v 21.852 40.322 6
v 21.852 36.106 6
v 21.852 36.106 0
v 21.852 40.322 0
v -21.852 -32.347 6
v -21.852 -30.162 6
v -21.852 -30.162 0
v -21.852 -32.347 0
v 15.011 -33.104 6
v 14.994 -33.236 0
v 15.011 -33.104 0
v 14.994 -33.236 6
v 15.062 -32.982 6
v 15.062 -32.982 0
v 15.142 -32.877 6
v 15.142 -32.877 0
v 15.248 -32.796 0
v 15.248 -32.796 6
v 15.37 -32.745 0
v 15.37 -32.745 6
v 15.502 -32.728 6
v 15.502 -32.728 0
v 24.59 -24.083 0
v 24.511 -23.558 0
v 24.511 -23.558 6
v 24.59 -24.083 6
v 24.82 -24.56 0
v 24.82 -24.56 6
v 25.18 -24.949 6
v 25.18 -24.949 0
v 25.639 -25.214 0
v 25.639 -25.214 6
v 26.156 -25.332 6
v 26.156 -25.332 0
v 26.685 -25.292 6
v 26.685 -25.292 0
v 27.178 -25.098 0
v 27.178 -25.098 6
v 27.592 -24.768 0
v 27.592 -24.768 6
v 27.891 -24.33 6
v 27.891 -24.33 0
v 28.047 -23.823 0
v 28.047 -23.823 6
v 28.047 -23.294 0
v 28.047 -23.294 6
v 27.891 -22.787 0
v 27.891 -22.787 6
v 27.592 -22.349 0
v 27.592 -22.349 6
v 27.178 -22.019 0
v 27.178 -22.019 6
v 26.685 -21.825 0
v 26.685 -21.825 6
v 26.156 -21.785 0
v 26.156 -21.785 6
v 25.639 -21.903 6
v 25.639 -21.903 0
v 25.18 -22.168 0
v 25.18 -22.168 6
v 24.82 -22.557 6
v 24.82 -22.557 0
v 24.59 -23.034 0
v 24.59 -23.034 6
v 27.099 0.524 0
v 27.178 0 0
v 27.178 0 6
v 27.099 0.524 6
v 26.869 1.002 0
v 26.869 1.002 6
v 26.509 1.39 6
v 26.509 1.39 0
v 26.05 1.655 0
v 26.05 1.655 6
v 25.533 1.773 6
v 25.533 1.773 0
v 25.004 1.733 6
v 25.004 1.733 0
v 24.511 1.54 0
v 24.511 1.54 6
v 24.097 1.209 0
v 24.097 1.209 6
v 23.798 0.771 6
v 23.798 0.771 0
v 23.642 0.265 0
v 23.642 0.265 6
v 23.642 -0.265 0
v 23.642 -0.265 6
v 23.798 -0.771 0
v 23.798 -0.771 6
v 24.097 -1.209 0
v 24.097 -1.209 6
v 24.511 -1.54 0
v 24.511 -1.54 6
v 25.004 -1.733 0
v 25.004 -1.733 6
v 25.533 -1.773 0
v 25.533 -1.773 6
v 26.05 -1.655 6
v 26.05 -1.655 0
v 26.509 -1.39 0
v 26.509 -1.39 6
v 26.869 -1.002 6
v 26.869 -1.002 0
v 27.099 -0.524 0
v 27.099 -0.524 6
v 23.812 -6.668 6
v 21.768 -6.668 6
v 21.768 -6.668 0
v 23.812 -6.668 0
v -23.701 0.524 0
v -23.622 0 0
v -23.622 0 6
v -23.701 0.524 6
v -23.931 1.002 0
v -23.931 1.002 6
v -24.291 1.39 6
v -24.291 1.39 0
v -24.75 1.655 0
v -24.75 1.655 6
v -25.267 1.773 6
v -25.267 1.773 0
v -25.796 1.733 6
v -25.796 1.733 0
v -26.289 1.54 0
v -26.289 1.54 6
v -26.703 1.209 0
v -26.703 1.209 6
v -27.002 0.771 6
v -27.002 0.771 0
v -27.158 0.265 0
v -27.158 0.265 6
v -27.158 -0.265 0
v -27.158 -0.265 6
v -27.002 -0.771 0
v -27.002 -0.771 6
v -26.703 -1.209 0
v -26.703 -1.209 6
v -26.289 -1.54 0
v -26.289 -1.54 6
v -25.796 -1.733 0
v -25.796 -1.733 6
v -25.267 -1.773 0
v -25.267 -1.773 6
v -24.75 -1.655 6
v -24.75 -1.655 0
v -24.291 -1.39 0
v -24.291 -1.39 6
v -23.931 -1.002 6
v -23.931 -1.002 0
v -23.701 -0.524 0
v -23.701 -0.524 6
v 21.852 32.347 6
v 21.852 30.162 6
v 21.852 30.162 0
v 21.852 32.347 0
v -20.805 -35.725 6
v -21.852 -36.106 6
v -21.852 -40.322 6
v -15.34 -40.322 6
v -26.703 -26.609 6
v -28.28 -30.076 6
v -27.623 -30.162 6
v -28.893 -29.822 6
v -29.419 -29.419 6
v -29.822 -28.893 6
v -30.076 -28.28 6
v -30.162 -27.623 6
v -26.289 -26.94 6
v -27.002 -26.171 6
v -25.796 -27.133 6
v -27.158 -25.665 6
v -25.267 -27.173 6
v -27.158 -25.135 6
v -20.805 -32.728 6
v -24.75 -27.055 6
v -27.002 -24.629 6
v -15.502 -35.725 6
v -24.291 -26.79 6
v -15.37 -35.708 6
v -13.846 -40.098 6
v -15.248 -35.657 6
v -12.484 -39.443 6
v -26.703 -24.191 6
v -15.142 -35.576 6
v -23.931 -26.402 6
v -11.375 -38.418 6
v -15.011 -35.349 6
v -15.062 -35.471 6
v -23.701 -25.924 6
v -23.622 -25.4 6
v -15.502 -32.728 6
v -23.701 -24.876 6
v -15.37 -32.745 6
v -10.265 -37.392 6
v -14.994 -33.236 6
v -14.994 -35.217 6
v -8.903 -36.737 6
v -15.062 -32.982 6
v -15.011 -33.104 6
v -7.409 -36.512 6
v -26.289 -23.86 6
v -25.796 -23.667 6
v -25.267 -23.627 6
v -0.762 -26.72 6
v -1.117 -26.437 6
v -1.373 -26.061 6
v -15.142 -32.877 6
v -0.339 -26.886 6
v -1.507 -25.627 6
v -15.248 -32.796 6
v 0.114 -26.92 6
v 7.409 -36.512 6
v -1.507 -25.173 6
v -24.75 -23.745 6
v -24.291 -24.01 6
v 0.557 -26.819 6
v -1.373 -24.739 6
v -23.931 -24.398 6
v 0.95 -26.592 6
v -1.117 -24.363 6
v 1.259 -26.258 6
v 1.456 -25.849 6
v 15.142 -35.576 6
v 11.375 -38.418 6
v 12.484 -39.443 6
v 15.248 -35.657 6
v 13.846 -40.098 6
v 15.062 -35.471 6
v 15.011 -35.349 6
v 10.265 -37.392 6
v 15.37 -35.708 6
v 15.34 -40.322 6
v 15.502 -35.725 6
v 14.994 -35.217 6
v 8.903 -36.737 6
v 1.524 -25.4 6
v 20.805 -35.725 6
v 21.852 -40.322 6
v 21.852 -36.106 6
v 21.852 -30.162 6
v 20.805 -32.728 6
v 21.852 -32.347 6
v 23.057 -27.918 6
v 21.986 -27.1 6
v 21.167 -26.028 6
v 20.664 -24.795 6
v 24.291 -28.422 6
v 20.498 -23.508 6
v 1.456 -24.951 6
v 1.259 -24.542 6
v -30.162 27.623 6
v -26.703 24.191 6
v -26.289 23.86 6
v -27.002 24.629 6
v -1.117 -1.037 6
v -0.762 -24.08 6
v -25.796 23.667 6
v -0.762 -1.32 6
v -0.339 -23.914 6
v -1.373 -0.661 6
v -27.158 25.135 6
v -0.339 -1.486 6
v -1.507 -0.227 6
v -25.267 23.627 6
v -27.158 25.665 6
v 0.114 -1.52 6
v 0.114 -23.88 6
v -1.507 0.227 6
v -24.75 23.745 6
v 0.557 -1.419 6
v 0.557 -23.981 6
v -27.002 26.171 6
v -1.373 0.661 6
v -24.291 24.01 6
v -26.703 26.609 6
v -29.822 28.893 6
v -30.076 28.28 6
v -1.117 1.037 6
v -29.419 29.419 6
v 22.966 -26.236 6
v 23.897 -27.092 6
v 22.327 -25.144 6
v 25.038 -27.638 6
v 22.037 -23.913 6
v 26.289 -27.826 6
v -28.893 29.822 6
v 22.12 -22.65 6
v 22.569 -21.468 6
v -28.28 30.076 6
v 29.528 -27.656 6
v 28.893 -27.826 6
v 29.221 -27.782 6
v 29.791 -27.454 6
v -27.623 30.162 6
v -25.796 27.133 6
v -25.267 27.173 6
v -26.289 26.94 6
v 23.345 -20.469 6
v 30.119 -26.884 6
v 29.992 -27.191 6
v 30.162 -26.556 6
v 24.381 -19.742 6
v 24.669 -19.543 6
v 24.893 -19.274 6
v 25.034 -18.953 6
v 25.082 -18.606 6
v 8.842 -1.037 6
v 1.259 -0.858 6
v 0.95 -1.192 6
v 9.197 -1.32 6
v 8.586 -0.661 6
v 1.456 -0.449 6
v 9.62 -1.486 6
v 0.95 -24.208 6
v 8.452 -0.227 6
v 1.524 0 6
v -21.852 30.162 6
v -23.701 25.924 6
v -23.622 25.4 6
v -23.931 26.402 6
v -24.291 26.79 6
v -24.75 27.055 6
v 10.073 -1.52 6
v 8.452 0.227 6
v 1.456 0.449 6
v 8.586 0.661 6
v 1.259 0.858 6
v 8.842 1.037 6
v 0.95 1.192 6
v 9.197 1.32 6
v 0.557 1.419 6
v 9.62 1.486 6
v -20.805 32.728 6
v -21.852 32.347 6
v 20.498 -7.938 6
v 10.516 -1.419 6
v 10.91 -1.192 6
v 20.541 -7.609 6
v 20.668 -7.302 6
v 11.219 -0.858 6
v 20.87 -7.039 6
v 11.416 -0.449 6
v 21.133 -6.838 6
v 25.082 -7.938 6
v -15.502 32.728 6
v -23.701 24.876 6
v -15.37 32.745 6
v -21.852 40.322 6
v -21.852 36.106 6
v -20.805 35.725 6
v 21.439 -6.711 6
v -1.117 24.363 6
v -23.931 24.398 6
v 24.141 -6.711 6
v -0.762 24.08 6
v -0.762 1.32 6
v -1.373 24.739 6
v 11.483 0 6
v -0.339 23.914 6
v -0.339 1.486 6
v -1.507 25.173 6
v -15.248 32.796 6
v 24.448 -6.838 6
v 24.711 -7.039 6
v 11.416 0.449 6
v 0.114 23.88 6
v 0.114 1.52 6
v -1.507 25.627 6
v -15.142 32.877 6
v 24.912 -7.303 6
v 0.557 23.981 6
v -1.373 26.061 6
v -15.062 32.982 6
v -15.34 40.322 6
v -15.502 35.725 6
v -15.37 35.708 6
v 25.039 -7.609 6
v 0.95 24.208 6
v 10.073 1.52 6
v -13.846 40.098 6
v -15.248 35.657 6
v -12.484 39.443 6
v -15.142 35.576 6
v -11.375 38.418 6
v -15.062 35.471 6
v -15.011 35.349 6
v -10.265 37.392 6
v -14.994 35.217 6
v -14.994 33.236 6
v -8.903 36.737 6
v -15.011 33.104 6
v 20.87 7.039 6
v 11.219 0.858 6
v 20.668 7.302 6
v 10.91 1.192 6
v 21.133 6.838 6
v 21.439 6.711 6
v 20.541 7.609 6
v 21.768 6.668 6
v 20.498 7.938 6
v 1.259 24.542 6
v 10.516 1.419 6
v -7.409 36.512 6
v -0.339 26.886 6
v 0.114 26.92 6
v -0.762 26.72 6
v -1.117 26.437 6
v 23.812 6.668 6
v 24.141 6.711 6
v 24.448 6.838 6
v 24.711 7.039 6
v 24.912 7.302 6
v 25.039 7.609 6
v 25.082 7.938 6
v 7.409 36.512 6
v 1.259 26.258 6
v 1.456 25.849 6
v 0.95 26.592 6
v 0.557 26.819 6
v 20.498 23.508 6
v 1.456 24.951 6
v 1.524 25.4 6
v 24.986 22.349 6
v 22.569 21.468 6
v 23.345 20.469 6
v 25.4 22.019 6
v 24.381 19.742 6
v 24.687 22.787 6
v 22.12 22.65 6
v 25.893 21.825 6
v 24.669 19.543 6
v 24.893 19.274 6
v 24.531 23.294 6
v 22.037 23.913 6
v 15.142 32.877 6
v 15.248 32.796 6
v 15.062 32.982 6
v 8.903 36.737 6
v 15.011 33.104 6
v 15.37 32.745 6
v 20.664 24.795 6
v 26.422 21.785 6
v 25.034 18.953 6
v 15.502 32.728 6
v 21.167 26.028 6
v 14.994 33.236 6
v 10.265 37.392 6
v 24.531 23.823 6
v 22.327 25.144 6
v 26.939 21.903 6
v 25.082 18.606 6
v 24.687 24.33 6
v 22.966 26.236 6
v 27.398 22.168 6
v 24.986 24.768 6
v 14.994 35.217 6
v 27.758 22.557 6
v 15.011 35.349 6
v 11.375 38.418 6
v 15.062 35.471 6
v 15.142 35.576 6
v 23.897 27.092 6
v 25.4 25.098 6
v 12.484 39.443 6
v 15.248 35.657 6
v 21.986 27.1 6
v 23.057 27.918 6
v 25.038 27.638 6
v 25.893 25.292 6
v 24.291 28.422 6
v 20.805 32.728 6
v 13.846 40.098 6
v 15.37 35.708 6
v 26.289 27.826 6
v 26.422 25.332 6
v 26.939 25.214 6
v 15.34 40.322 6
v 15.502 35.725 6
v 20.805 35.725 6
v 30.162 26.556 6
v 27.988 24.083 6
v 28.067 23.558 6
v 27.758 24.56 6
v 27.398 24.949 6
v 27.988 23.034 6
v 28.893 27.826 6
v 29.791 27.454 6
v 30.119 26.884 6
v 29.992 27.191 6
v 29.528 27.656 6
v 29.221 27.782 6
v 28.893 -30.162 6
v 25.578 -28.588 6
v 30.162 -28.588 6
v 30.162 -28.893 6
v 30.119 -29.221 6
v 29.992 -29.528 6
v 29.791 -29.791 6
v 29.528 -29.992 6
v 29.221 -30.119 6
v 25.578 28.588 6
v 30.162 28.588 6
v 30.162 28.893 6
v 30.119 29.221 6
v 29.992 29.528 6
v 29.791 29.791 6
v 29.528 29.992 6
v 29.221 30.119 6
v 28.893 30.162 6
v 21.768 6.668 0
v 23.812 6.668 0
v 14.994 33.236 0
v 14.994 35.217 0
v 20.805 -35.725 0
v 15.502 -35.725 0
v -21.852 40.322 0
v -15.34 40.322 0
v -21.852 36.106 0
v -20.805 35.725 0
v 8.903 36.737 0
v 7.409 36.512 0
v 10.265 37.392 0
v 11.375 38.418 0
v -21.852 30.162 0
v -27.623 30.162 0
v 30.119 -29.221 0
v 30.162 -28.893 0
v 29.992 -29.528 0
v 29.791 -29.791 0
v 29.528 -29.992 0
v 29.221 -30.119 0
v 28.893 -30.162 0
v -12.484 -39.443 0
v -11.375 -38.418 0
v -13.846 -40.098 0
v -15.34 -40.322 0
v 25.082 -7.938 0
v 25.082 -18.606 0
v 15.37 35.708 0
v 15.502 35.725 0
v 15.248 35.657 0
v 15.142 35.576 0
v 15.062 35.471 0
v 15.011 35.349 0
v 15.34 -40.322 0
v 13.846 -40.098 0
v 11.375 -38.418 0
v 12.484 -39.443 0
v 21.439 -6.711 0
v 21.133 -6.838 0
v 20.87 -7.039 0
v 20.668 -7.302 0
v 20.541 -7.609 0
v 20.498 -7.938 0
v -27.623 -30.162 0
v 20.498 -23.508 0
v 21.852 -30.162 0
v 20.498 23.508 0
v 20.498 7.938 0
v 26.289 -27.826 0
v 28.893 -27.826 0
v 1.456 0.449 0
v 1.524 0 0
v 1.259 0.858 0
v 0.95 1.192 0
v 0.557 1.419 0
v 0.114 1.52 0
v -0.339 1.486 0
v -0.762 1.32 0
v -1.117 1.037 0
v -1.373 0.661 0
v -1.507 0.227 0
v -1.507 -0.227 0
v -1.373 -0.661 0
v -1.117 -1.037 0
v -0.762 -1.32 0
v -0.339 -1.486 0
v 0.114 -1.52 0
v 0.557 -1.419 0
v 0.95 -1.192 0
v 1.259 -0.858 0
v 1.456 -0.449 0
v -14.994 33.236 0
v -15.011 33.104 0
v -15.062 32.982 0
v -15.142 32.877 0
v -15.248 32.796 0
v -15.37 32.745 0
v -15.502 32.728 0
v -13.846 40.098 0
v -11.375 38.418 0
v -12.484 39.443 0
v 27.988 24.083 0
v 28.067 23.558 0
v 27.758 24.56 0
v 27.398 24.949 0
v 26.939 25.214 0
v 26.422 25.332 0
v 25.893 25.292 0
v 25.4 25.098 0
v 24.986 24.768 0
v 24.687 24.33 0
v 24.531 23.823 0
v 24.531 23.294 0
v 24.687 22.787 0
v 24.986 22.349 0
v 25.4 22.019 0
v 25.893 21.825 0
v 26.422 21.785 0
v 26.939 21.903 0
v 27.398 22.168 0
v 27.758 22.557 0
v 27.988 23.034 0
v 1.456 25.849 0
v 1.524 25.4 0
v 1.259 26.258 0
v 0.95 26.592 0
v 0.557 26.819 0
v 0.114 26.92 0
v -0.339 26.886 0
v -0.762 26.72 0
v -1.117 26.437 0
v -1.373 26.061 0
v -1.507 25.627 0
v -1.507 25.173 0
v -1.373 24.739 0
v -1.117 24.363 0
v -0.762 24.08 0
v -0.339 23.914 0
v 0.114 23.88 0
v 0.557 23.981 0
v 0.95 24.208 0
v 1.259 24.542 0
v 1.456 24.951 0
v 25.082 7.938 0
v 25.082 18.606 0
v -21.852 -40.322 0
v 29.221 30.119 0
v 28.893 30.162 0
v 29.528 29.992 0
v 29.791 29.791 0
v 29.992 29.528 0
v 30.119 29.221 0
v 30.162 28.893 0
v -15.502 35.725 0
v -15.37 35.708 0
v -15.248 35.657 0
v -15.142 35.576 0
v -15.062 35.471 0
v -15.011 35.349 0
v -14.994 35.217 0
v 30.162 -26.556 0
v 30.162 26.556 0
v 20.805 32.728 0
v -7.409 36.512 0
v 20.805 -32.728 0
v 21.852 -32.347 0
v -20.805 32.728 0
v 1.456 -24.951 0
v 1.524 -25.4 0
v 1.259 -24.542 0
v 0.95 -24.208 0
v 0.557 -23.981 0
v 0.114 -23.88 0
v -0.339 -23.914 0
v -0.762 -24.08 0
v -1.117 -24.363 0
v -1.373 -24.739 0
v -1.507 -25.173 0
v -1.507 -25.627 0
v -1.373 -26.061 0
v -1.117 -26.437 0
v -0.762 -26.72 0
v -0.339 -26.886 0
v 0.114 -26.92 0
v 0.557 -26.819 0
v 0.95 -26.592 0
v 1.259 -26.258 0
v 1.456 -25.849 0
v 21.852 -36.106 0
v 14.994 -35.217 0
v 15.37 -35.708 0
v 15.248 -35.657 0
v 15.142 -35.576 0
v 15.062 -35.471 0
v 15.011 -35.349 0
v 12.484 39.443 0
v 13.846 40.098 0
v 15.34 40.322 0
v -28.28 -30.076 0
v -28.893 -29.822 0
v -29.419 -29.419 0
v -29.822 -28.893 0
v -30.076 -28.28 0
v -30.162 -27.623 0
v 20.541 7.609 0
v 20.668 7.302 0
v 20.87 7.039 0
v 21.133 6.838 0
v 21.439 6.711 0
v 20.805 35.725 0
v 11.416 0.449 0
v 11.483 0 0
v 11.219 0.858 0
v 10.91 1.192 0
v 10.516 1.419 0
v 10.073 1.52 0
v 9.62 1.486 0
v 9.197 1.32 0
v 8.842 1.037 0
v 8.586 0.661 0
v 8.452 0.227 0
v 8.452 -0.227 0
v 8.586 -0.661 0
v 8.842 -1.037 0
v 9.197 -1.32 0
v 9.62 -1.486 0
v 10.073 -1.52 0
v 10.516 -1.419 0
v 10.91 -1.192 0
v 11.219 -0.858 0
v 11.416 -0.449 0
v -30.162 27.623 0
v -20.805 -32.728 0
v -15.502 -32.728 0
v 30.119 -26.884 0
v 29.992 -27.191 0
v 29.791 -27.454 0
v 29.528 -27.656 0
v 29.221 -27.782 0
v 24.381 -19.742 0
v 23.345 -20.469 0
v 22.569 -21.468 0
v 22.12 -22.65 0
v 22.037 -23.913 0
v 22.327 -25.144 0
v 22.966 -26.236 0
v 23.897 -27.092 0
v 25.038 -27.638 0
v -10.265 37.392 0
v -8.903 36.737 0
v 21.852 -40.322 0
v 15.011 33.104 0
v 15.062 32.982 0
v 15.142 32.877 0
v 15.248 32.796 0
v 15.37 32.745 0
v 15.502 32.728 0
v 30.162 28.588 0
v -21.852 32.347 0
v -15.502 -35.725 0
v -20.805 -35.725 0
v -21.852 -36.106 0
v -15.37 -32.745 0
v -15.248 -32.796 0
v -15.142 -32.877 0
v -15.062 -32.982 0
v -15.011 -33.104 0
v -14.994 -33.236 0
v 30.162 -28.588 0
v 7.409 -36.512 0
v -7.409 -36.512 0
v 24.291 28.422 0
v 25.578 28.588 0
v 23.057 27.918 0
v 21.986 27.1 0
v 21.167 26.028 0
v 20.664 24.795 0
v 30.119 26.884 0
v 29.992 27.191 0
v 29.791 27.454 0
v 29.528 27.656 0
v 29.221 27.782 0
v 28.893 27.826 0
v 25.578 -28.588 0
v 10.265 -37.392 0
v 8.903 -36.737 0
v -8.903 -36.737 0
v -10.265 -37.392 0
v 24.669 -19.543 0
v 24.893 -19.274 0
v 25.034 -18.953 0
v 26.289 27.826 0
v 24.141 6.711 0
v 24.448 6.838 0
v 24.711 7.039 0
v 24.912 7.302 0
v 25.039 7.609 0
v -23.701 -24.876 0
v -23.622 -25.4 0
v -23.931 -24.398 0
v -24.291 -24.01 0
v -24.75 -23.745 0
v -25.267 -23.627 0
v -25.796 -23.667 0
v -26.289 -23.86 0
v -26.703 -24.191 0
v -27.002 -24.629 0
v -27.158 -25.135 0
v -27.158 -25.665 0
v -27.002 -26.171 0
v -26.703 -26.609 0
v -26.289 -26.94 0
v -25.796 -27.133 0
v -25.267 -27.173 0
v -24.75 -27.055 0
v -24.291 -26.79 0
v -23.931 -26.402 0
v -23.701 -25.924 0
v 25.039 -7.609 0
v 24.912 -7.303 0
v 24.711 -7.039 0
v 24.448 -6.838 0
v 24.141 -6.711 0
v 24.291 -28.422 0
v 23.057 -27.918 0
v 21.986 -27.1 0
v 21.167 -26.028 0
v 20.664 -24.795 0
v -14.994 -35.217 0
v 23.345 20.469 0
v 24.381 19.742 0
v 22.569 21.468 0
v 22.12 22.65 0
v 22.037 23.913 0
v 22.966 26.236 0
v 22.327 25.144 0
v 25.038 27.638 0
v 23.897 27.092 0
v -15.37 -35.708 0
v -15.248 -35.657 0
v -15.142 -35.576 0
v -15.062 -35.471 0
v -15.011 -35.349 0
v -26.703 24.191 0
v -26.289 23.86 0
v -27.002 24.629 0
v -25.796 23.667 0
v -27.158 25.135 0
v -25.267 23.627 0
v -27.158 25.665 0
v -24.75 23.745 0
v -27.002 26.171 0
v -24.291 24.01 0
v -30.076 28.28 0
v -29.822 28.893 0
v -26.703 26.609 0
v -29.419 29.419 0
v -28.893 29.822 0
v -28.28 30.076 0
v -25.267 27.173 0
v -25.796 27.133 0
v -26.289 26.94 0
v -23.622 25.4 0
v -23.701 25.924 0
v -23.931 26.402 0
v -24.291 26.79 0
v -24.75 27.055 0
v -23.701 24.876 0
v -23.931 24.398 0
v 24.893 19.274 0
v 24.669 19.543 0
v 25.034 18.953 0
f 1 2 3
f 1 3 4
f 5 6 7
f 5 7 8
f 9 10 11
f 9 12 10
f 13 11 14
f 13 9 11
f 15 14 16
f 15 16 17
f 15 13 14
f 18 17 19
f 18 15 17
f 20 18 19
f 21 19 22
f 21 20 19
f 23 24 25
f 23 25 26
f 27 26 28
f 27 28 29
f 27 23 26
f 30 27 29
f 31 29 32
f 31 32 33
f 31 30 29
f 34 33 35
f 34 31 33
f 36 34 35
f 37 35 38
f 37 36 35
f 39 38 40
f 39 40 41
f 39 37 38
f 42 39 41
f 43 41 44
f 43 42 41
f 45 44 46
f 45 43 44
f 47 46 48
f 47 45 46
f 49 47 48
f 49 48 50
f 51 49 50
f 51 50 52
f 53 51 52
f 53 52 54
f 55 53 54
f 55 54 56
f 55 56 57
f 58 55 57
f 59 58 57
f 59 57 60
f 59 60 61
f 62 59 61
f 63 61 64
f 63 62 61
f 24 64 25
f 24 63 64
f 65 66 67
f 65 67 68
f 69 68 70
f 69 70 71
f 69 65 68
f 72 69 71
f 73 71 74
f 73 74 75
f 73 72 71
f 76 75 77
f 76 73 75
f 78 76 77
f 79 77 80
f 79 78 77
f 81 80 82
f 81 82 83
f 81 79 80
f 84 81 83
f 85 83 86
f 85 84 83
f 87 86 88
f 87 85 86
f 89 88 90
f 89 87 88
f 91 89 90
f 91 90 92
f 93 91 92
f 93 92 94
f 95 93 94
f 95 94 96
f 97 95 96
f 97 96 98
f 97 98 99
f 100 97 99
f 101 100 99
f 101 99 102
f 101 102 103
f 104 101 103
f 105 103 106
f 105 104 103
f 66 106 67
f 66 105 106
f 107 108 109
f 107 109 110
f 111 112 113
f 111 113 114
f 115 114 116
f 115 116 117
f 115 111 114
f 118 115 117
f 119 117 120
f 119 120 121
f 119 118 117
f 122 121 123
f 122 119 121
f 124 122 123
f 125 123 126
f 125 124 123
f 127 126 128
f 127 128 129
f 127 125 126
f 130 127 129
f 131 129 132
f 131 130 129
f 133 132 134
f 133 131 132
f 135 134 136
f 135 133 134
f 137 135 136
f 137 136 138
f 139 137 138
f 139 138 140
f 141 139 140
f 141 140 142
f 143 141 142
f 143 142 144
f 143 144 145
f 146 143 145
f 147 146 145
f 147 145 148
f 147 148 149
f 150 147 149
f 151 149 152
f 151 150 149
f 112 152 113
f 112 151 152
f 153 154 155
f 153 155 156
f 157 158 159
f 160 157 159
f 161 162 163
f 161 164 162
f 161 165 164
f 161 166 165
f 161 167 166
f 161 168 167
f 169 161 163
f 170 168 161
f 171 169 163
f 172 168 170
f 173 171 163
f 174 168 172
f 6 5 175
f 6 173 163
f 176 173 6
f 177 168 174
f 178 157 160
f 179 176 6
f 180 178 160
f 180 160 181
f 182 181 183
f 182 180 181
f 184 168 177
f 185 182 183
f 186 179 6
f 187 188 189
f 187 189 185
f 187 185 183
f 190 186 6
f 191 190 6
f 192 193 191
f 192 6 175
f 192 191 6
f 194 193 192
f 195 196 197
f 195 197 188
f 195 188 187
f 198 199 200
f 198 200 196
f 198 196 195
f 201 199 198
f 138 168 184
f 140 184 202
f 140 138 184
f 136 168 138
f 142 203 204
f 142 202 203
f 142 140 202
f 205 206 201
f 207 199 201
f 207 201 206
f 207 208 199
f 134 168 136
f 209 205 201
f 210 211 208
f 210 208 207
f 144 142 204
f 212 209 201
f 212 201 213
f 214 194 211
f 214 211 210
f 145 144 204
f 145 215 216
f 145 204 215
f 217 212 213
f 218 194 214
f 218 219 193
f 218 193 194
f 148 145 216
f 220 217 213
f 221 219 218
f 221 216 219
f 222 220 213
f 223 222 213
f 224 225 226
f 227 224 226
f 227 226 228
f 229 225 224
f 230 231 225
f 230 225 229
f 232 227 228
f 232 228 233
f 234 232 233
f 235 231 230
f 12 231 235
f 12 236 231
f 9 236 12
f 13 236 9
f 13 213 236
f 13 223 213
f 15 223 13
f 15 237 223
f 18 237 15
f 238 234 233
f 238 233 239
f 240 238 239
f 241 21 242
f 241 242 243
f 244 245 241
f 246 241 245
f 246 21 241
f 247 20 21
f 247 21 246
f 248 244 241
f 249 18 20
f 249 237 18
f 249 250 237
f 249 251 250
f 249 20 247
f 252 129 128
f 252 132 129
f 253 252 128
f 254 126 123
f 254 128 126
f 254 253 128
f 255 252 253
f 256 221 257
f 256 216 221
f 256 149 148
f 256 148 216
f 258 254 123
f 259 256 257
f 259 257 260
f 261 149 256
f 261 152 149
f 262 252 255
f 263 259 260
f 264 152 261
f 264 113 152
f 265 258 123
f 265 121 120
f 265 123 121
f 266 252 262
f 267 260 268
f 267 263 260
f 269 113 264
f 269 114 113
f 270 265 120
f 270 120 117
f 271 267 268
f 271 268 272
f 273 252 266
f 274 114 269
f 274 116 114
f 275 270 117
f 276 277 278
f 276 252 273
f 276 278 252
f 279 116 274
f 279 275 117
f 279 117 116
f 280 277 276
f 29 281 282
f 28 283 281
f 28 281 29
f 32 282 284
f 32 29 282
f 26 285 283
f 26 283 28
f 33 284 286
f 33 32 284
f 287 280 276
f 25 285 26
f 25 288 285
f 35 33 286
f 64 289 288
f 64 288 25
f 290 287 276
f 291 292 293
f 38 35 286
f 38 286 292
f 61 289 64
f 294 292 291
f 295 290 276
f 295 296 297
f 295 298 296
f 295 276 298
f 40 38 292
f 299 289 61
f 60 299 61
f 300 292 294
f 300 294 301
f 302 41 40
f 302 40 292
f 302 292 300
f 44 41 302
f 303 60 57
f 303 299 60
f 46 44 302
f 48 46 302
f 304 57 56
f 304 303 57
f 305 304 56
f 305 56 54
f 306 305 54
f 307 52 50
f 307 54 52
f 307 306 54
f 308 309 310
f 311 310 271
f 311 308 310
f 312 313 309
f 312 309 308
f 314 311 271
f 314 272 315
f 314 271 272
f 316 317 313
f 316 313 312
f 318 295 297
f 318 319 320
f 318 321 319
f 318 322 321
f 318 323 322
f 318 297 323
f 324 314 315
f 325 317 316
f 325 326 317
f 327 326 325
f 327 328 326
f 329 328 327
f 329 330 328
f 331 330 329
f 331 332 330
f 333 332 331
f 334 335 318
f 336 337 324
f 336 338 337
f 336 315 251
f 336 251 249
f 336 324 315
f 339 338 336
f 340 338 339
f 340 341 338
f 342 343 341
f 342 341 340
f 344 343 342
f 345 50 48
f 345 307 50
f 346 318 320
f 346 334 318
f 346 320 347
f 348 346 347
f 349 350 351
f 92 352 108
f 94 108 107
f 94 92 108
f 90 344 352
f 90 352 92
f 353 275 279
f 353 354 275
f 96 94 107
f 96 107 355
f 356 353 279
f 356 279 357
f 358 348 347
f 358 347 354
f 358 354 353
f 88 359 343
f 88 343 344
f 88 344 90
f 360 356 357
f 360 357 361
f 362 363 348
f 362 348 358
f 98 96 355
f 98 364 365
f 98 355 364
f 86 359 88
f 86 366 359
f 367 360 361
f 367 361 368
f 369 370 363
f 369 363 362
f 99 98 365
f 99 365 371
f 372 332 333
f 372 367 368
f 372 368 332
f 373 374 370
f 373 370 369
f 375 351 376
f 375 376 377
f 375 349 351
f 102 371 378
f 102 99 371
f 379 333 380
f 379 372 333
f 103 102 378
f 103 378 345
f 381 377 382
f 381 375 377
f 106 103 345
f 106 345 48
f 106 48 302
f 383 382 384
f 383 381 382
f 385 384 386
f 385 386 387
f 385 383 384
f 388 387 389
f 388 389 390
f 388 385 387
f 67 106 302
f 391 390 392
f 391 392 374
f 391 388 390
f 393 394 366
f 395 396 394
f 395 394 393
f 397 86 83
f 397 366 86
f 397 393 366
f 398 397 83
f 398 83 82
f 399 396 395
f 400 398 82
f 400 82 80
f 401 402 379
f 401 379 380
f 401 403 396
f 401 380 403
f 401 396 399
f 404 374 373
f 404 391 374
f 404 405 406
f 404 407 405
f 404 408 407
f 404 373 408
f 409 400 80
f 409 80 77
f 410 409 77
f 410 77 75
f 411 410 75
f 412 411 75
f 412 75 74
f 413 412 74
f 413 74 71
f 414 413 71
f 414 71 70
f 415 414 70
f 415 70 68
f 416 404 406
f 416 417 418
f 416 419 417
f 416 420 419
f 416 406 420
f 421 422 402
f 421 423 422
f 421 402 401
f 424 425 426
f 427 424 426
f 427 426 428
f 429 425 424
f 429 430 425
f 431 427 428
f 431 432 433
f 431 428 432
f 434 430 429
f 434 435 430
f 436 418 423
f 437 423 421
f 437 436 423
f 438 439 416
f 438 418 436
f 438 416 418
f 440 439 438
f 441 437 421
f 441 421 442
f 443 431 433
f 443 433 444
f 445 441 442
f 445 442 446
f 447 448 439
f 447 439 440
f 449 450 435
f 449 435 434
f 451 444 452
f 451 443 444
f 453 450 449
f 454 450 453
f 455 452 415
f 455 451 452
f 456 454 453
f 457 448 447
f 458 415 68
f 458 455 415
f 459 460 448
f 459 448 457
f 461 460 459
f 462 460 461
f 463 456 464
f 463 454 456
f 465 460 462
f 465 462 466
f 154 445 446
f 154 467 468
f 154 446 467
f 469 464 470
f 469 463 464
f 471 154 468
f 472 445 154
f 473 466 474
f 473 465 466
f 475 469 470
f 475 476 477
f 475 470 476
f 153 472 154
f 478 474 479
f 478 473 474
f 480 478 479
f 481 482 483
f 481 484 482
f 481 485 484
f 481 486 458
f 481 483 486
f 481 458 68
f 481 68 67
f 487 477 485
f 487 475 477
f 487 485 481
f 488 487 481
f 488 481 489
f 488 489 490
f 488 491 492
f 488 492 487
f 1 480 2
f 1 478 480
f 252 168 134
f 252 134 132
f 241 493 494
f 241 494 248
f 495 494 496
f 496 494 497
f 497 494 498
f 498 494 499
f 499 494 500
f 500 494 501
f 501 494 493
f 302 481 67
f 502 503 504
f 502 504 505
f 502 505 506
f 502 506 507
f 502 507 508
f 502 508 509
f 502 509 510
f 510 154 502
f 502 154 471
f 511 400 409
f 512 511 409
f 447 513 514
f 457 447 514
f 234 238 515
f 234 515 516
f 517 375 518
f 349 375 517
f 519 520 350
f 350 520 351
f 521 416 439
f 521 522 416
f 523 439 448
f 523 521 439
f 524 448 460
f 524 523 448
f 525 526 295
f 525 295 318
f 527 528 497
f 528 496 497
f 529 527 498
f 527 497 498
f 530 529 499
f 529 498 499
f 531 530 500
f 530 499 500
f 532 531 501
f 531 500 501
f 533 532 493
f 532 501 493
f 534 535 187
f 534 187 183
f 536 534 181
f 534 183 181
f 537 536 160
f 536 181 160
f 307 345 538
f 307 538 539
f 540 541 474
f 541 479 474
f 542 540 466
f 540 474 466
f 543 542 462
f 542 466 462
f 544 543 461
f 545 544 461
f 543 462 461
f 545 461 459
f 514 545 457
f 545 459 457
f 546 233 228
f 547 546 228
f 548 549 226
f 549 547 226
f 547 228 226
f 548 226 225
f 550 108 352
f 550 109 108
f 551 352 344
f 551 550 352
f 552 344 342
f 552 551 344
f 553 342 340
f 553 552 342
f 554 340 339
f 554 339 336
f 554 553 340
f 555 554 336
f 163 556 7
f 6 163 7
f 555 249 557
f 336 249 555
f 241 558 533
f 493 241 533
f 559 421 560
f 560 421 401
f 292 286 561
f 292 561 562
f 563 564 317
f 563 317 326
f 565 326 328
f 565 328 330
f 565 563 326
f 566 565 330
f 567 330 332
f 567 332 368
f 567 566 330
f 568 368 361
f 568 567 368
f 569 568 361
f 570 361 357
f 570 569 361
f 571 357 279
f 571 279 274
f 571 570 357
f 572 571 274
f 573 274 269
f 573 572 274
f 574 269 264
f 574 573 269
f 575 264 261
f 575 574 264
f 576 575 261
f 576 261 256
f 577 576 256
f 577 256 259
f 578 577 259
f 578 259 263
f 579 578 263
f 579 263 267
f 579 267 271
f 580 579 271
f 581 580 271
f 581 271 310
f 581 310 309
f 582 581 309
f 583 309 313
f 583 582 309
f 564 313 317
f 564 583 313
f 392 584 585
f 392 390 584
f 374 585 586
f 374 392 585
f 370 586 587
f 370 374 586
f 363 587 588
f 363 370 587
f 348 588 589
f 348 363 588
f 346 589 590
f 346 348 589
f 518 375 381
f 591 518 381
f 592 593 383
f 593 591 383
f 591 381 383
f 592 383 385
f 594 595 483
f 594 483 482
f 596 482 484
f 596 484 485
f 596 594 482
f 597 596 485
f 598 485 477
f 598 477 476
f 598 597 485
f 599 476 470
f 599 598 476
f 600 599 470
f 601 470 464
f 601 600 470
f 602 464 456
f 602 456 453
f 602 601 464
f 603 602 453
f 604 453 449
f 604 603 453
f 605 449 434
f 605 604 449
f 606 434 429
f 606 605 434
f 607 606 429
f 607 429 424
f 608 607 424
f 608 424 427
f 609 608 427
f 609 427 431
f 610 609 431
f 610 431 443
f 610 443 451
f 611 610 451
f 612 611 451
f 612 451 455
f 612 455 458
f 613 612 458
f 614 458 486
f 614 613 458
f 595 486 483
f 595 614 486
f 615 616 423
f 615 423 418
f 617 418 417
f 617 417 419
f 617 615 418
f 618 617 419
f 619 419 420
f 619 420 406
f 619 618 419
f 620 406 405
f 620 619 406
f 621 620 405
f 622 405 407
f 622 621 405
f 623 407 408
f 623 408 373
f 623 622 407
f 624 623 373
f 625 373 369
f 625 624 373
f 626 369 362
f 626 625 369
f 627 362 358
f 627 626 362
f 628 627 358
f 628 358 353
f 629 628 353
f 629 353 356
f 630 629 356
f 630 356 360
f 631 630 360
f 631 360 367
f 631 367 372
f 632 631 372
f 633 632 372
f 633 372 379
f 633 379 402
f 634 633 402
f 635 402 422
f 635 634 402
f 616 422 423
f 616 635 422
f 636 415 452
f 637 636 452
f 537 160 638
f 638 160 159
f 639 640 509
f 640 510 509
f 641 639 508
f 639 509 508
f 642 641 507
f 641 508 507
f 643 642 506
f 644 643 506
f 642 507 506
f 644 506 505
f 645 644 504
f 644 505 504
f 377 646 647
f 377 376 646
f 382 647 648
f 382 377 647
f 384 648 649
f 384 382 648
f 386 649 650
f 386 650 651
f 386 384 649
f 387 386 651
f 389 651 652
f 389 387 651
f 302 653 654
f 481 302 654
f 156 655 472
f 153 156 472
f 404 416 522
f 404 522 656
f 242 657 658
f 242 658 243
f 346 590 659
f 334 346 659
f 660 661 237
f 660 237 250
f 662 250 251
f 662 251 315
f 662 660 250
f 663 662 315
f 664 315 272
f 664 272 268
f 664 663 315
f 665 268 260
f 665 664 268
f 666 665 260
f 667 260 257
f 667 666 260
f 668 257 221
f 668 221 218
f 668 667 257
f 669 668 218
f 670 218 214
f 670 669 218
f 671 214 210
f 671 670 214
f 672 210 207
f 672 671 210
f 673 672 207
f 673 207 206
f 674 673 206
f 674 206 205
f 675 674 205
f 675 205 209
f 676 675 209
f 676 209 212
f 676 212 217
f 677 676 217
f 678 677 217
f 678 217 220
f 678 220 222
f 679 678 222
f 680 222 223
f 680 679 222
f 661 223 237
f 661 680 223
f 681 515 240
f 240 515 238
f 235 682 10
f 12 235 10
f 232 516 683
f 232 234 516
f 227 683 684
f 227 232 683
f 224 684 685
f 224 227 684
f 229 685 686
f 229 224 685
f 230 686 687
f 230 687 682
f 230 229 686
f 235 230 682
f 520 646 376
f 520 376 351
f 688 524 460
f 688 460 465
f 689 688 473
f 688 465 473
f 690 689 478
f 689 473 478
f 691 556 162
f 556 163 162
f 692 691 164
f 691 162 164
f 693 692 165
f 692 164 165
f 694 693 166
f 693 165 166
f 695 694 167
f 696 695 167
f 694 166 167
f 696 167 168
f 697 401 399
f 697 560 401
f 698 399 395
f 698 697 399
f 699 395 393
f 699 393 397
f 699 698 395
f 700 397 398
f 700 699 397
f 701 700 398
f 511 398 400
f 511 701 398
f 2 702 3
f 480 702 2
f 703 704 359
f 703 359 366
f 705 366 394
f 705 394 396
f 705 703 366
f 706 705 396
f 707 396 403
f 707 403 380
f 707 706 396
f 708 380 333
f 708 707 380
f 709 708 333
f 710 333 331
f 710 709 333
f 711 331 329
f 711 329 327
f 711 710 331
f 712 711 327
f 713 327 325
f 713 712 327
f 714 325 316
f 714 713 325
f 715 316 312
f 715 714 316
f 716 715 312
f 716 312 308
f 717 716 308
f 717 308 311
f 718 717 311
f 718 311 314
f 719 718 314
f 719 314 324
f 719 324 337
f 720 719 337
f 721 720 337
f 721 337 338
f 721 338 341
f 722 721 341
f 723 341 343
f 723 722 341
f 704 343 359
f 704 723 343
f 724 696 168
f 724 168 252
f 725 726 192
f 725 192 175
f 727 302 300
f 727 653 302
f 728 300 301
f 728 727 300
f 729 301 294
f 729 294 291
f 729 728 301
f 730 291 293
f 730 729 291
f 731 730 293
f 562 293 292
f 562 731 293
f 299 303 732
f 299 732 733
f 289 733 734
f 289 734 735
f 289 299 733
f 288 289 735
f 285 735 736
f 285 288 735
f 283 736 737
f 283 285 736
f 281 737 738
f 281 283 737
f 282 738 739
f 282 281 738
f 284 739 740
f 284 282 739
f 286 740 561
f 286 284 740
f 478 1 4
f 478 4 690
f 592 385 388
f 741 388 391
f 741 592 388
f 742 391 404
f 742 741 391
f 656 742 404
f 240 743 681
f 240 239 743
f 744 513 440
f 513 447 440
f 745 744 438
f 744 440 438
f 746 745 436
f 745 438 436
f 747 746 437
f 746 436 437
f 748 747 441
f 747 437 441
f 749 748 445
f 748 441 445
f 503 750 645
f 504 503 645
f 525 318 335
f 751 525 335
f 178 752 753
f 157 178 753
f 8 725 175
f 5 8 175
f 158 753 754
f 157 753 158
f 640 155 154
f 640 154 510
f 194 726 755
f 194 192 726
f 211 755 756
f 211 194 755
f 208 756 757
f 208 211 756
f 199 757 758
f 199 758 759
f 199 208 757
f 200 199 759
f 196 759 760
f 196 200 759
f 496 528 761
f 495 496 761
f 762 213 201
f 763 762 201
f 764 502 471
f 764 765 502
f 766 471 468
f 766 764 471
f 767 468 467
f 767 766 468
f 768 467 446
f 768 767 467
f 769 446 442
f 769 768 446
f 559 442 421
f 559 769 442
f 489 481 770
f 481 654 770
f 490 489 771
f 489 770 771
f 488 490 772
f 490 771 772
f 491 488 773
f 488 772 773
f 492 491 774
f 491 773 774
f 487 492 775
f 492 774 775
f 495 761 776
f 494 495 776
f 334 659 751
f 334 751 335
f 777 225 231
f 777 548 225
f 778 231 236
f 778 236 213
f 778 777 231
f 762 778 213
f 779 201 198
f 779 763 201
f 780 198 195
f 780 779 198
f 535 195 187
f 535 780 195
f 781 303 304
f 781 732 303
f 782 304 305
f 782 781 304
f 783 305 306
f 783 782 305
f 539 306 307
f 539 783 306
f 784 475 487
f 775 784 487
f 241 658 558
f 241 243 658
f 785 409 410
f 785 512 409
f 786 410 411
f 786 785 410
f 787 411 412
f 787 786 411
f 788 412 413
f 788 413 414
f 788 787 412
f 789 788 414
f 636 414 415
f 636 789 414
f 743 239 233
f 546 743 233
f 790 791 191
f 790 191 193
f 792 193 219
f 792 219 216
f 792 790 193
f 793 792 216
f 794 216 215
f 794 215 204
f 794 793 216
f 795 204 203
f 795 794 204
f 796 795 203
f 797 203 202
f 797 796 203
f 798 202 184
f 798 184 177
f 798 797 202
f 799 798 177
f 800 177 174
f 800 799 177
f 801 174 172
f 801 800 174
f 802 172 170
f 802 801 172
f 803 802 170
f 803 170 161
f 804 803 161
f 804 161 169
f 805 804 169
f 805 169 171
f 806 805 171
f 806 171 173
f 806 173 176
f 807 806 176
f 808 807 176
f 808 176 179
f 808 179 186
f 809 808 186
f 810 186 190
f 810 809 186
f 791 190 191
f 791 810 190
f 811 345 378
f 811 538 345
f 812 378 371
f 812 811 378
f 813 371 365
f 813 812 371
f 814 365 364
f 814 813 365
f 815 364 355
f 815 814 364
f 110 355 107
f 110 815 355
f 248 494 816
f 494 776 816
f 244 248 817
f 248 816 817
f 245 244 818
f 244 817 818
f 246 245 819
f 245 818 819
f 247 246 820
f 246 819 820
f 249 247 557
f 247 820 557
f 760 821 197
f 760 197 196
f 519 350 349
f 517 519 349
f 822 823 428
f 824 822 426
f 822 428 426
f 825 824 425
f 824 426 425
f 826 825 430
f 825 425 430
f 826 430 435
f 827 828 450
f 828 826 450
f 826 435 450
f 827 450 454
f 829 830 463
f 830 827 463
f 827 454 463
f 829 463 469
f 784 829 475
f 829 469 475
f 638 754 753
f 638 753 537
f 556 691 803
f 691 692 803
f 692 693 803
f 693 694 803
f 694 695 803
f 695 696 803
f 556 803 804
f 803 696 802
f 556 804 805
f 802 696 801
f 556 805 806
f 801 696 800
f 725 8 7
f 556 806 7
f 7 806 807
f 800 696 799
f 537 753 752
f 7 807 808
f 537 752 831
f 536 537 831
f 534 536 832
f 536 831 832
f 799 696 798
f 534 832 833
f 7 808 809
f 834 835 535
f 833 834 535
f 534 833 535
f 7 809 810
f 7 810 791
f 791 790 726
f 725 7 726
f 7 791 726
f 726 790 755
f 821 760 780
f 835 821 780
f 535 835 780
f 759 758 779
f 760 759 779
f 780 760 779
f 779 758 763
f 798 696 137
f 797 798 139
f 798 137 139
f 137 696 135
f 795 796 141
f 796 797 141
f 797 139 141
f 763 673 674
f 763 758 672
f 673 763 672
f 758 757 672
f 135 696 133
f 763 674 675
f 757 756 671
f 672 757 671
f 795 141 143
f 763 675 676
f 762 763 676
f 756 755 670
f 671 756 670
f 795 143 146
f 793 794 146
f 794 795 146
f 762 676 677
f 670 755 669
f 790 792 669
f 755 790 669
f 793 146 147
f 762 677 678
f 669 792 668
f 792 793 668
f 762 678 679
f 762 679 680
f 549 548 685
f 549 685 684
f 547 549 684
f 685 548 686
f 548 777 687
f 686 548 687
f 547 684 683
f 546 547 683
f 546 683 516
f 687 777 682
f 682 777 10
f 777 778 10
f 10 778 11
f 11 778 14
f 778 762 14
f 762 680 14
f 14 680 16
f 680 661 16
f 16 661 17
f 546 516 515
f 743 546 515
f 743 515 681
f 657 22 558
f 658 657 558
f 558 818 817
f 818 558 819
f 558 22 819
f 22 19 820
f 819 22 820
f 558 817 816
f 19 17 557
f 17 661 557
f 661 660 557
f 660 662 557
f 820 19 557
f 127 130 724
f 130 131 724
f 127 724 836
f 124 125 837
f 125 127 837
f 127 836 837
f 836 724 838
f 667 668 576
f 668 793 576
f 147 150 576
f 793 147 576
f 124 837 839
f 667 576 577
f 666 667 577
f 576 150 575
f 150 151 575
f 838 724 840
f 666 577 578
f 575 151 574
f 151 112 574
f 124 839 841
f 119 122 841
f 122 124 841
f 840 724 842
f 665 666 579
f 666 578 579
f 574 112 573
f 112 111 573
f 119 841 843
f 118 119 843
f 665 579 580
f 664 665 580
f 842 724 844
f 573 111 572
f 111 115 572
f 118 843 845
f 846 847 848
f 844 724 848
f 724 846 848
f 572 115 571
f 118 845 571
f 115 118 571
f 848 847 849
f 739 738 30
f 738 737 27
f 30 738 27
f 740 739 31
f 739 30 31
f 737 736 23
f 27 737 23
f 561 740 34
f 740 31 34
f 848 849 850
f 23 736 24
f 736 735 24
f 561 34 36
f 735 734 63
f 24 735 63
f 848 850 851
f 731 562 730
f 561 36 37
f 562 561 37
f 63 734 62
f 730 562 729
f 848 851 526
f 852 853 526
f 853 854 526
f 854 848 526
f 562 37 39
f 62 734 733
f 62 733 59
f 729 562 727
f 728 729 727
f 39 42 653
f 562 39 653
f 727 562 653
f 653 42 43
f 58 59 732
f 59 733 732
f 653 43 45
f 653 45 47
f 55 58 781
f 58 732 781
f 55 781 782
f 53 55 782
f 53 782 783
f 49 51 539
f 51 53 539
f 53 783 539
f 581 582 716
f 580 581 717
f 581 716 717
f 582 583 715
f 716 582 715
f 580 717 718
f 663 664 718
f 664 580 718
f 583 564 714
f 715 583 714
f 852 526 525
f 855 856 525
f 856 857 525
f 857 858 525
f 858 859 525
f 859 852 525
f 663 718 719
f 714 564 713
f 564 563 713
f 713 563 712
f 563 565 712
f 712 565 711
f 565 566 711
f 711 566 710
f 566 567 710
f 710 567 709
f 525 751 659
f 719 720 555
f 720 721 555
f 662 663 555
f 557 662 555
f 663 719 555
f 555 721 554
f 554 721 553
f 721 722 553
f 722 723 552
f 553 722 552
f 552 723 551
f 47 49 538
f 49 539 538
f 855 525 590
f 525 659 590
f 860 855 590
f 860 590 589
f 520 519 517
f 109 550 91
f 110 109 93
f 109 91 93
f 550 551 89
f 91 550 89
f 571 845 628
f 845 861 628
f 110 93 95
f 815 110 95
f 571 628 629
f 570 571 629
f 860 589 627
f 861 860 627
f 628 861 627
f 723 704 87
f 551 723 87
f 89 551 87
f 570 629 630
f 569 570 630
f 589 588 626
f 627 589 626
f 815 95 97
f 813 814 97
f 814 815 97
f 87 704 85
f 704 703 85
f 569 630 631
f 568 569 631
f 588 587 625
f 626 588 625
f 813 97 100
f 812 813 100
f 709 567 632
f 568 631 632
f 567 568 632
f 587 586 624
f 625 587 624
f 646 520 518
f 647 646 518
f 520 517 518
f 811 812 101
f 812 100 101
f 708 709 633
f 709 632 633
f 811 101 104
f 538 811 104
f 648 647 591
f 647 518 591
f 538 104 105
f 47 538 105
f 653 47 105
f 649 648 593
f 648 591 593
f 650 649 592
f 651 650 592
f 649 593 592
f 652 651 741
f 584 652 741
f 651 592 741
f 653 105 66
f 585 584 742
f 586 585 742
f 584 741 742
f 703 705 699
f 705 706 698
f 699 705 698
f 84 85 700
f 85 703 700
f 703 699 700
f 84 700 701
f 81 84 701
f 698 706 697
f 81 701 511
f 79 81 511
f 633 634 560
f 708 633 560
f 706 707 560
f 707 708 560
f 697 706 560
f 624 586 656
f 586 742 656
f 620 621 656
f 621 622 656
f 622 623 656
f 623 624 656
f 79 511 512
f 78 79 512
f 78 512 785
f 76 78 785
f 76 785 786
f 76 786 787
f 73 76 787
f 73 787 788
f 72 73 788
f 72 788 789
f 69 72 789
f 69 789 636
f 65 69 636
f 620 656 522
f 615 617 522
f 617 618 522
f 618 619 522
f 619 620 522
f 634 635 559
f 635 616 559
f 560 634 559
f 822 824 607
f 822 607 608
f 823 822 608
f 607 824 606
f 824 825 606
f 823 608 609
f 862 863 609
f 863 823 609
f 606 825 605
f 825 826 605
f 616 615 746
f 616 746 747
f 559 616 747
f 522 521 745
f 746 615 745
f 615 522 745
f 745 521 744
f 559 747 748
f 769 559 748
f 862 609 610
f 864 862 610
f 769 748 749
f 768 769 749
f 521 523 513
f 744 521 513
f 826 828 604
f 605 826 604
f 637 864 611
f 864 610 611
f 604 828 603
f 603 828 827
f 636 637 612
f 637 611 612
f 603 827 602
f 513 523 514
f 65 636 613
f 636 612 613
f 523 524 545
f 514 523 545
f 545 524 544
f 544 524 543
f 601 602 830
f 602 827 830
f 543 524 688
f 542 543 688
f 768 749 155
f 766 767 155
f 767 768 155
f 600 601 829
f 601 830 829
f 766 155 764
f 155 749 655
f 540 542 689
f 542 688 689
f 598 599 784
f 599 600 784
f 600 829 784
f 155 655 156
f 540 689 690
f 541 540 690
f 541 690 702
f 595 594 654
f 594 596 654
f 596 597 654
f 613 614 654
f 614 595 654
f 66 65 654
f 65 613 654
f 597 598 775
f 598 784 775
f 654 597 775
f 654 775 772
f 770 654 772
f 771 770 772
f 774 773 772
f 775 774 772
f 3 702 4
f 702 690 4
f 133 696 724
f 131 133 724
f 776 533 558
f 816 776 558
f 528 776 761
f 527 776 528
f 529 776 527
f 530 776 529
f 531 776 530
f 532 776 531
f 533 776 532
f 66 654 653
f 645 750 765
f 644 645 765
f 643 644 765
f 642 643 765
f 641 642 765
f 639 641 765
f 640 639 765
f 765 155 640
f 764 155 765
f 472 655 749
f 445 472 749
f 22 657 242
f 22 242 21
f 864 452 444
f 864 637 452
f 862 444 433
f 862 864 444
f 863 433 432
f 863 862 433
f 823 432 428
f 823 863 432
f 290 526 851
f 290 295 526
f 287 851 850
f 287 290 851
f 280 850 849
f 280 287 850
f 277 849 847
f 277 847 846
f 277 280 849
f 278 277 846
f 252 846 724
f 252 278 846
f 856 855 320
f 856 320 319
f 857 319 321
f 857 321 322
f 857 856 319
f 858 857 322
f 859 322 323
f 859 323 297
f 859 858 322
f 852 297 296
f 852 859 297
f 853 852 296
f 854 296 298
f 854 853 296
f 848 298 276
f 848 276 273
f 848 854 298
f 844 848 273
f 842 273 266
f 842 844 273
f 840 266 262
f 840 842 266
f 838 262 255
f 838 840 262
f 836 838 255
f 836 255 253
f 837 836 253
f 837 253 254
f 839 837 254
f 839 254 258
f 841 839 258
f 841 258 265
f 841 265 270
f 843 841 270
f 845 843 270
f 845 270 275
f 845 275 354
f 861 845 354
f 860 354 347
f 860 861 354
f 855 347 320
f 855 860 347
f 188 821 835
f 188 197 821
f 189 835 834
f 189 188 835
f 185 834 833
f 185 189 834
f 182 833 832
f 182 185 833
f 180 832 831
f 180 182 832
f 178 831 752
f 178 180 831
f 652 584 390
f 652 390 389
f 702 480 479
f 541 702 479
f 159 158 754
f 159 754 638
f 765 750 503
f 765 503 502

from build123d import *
from OCP.BRepFilletAPI import BRepFilletAPI_MakeChamfer

# Parameters (mm, degrees)
SKETCH1_W           = 60.325
SKETCH1_H           = 60.325
SKETCH1_R           = 1.778
SKETCH1_R_2         = 1.524
BOSS_EXTRUDE1_DEPTH = 6
CUT_EXTRUDE1_DEPTH  = 44.076128105
FILLET7_R           = 1.27
FILLET8_R           = 1.27
FILLET9_R           = 2.54
FILLET15_R          = 5.08
SKETCH4_W           = 2.54
SKETCH4_H           = 1.5875
BOSS_EXTRUDE2_DEPTH = 6
SKETCH6_W           = 12.7
SKETCH6_H           = 6.35
BOSS_EXTRUDE3_DEPTH = 6
FILLET10_R          = 2.54
FILLET11_R          = 2.54
BOSS_EXTRUDE4_DEPTH = 6
FILLET12_R          = 5.08
FILLET13_R          = 5.08
CUT_EXTRUDE2_REACH  = 52.712
SKETCH9_W           = 6.858
SKETCH9_H           = 2.9972
CHAMFER1_SIZE       = 0.381
CHAMFER1_SIZE2      = 1.046788897
FILLET14_R          = 0.508


with BuildPart() as part:
    # Sketch1 → Boss-Extrude1 (new body)
    with BuildSketch(Plane.XY):
        Rectangle(SKETCH1_W, SKETCH1_H)
        with Locations((26.289, 23.5585)):
            Circle(SKETCH1_R, mode=Mode.SUBTRACT)
        with Locations(Location((26.289, -23.5585, 0), (0, 0, 180))):
            Circle(SKETCH1_R, mode=Mode.SUBTRACT)
        with Locations((-25.4, 25.4)):
            Circle(SKETCH1_R, mode=Mode.SUBTRACT)
        with Locations((-25.4, -25.4)):
            Circle(SKETCH1_R, mode=Mode.SUBTRACT)
        with Locations((0, 25.4)):
            Circle(SKETCH1_R_2, mode=Mode.SUBTRACT)
        Circle(SKETCH1_R_2, mode=Mode.SUBTRACT)
        with Locations((0, -25.4)):
            Circle(SKETCH1_R_2, mode=Mode.SUBTRACT)
        with Locations((-25.4, 0)):
            Circle(SKETCH1_R, mode=Mode.SUBTRACT)
        with Locations((9.95934, 0)):
            Circle(SKETCH1_R_2, mode=Mode.SUBTRACT)
        with Locations((25.4, 0)):
            Circle(SKETCH1_R, mode=Mode.SUBTRACT)
    extrude(amount=BOSS_EXTRUDE1_DEPTH)

    # Sketch5 → Cut-Extrude1 (cut, through all)
    with BuildSketch(Plane.XY.offset(6)):
        with BuildLine():
            Line((20.4978, 23.5585), (20.4978, 6.6675))
            Line((20.4978, 6.6675), (25.0825, 6.6675))
            Line((25.0825, 6.6675), (25.0825, 19.465413928))
            ThreePointArc((25.0825, 19.465413928), (22.065552787, 24.167999366), (26.289, 27.8257))
            Line((26.289, 27.8257), (30.1625, 27.8257))
            Line((30.1625, 27.8257), (30.1625, 28.5877))
            Line((30.1625, 28.5877), (23.417563983, 28.5877))
            ThreePointArc((23.417563983, 28.5877), (21.28065408, 26.46615689), (20.4978, 23.5585))
        make_face()
    cut_extrude1 = extrude(amount=-CUT_EXTRUDE1_DEPTH, mode=Mode.SUBTRACT)

    # Fillet7
    fillet7_edges = [part.edges().sort_by_distance(p)[0] for p in [
        (30.1625, 27.8257, 3),
        (25.0825, 19.465413928, 3),
        (25.0825, 6.6675, 3),
        (20.4978, 6.6675, 3),
        (30.1625, 30.1625, 3),
    ]]
    fillet(fillet7_edges, radius=FILLET7_R)

    # Mirror1: Cut-Extrude1 across plane
    add(cut_extrude1.mirror(Plane.ZX), mode=Mode.SUBTRACT)

    # Fillet8
    fillet8_edges = [part.edges().sort_by_distance(p)[0] for p in [
        (20.4978, -6.6675, 3),
        (25.0825, -6.6675, 3),
        (25.0825, -19.465413928, 3),
        (30.1625, -27.8257, 3),
        (30.1625, -30.1625, 3),
    ]]
    fillet(fillet8_edges, radius=FILLET8_R)

    # Fillet9
    fillet9_edges = [part.edges().sort_by_distance(p)[0] for p in [
        (-30.1625, 30.1625, 3),
        (-30.1625, -30.1625, 3),
    ]]
    fillet(fillet9_edges, radius=FILLET9_R)

    # Fillet15
    fillet15_edges = [part.edges().sort_by_distance(p)[0] for p in [
        (23.417563983, -28.5877, 3),
        (23.417563983, 28.5877, 3),
    ]]
    fillet(fillet15_edges, radius=FILLET15_R)

    # Sketch4 → Boss-Extrude2 (add)
    with BuildSketch(Plane.XY.offset(6)):
        with Locations((20.58162, 30.95625)):
            Rectangle(SKETCH4_W, SKETCH4_H)
        with Locations((20.58162, -30.95625)):
            Rectangle(SKETCH4_W, SKETCH4_H)
        with Locations((-20.58162, 30.95625)):
            Rectangle(SKETCH4_W, SKETCH4_H)
        with Locations((-20.58162, -30.95625)):
            Rectangle(SKETCH4_W, SKETCH4_H)
    extrude(amount=-BOSS_EXTRUDE2_DEPTH)

    # Sketch6 → Boss-Extrude3 (add)
    with BuildSketch(Plane.XY.offset(6)):
        with Locations((0, 33.3375)):
            Rectangle(SKETCH6_W, SKETCH6_H)
    boss_extrude3 = extrude(amount=-BOSS_EXTRUDE3_DEPTH)

    # Fillet10
    fillet10_edges = [part.edges().sort_by_distance(p)[0] for p in [
        (6.35, 30.1625, 3),
        (6.35, 36.5125, 3),
        (-6.35, 36.5125, 3),
        (-6.35, 30.1625, 3),
    ]]
    fillet(fillet10_edges, radius=FILLET10_R)

    # Mirror2: Boss-Extrude3 across plane
    add(boss_extrude3.mirror(Plane.ZX))

    # Fillet11
    fillet11_edges = [part.edges().sort_by_distance(p)[0] for p in [
        (-6.35, -36.5125, 3),
        (-6.35, -30.1625, 3),
        (6.35, -30.1625, 3),
        (6.35, -36.5125, 3),
    ]]
    fillet(fillet11_edges, radius=FILLET11_R)

    # Sketch7 → Boss-Extrude4 (add)
    with BuildSketch(Plane.XY.offset(6)):
        Polygon((-21.85162, 30.1625), (21.85162, 30.1625), (21.85162, 36.5125), (21.85162, 40.3225), (10.42162, 40.3225), (10.42162, 36.5125), (-10.42162, 36.5125), (-10.42162, 40.3225), (-21.85162, 40.3225), (-21.85162, 36.5125), align=None)
        Polygon((-21.85162, -30.1625), (21.85162, -30.1625), (21.85162, -36.5125), (21.85162, -40.3225), (10.42162, -40.3225), (10.42162, -36.5125), (-10.42162, -36.5125), (-10.42162, -40.3225), (-21.85162, -40.3225), (-21.85162, -36.5125), align=None)
    extrude(amount=-BOSS_EXTRUDE4_DEPTH)

    # Fillet12
    # the kernel refuses this fillet: 5.08 mm, written as the material it takes off along each edge
    with BuildSketch(Plane(origin=(-10.42162, -40.3225, 18.296722124), x_dir=(0, 1, 0), z_dir=(0, 0, -1)), Plane(origin=(10.42162, 40.3225, 18.296722124), x_dir=(0, -1, 0), z_dir=(0, 0, -1))) as fillet12_piece_1:
        with BuildLine():
            CenterArc((5.08, -4.91868885), FILLET12_R, 104.477512186, 75.522487814)
            Line((0, -4.91868885), (-0.1016, -4.91868885))
            Line((-0.1016, -4.91868885), (-0.1016, 0))
            Line((-0.1016, 0), (0, 0.1016))
            ThreePointArc((0, 0.1016), (1.905, 0.1016), (3.7846, 0.098373777))
            Line((3.7846, 0.098373777), (3.81, 0))
        make_face()
    extrude(amount=30.593444248, mode=Mode.SUBTRACT)
    with BuildSketch(Plane(origin=(10.42162, -40.3225, 18.296722124), x_dir=(1, 0, 0), z_dir=(0, 0, -1)), Plane(origin=(-10.42162, 40.3225, 18.296722124), x_dir=(-1, 0, 0), z_dir=(0, 0, -1))) as fillet12_piece_2:
        with BuildLine():
            CenterArc((4.91868885, -5.08), FILLET12_R, 90, 75.522487814)
            Line((0, -3.81), (-0.098373777, -3.7846))
            ThreePointArc((-0.098373777, -3.7846), (-0.1016, -1.905), (-0.1016, 0))
            Line((-0.1016, 0), (0, 0.1016))
            Line((0, 0.1016), (4.91868885, 0.1016))
            Line((4.91868885, 0.1016), (4.91868885, 0))
        make_face()
    extrude(amount=30.593444248, mode=Mode.SUBTRACT)

    # Fillet13
    fillet13_edges = [part.edges().sort_by_distance(p)[0] for p in [
        (10.42162, 36.5125, 3),
        (-10.42162, 36.5125, 3),
        (-10.42162, -36.5125, 3),
        (10.42162, -36.5125, 3),
    ]]
    fillet(fillet13_edges, radius=FILLET13_R)

    # Sketch9 → Cut-Extrude2 (cut, up to next)
    with BuildSketch(Plane(origin=(0, 0, 0), x_dir=(-1, 0, 0), z_dir=(0, 0, -1)), mode=Mode.PRIVATE) as cut_extrude2_sk1:
        with Locations((-18.42262, 34.2265)):
            Rectangle(SKETCH9_W, SKETCH9_H)
    cut_extrude2_tool1 = extrude(cut_extrude2_sk1.sketch, amount=-CUT_EXTRUDE2_REACH, mode=Mode.PRIVATE) & part.part
    # Sketch9 → Cut-Extrude2 (cut, up to next)
    with BuildSketch(Plane(origin=(0, 0, 0), x_dir=(-1, 0, 0), z_dir=(0, 0, -1)), mode=Mode.PRIVATE) as cut_extrude2_sk2:
        with Locations((18.42262, 34.2265)):
            Rectangle(SKETCH9_W, SKETCH9_H)
    cut_extrude2_tool2 = extrude(cut_extrude2_sk2.sketch, amount=-CUT_EXTRUDE2_REACH, mode=Mode.PRIVATE) & part.part
    # Sketch9 → Cut-Extrude2 (cut, up to next)
    with BuildSketch(Plane(origin=(0, 0, 0), x_dir=(-1, 0, 0), z_dir=(0, 0, -1)), mode=Mode.PRIVATE) as cut_extrude2_sk3:
        with Locations((-18.42262, -34.2265)):
            Rectangle(SKETCH9_W, SKETCH9_H)
    cut_extrude2_tool3 = extrude(cut_extrude2_sk3.sketch, amount=-CUT_EXTRUDE2_REACH, mode=Mode.PRIVATE) & part.part
    # Sketch9 → Cut-Extrude2 (cut, up to next)
    with BuildSketch(Plane(origin=(0, 0, 0), x_dir=(-1, 0, 0), z_dir=(0, 0, -1)), mode=Mode.PRIVATE) as cut_extrude2_sk4:
        with Locations((18.42262, -34.2265)):
            Rectangle(SKETCH9_W, SKETCH9_H)
    cut_extrude2_tool4 = extrude(cut_extrude2_sk4.sketch, amount=-CUT_EXTRUDE2_REACH, mode=Mode.PRIVATE) & part.part
    add(cut_extrude2_tool1.solids().sort_by_distance((18.42262, 34.2265, 0))[0], mode=Mode.SUBTRACT)
    add(cut_extrude2_tool2.solids().sort_by_distance((-18.42262, 34.2265, 0))[0], mode=Mode.SUBTRACT)
    add(cut_extrude2_tool3.solids().sort_by_distance((18.42262, -34.2265, 0))[0], mode=Mode.SUBTRACT)
    add(cut_extrude2_tool4.solids().sort_by_distance((-18.42262, -34.2265, 0))[0], mode=Mode.SUBTRACT)

    # Chamfer1: one chamfer whose edges measure the first distance from different faces: ONE call of the kernel's chamfer builder (chamfer() names one face for all edges)
    chamfer1_edges_1 = [part.edges().sort_by_distance(p)[0] for p in [
        (21.85162, 32.7279, 3),
    ]]
    chamfer1_side_1 = [part.faces().sort_by_distance(p)[0] for p in [
        (21.85162, 31.4452, 3),
    ]]
    chamfer1_edges_2 = [part.edges().sort_by_distance(p)[0] for p in [
        (21.85162, 35.7251, 3),
    ]]
    chamfer1_side_2 = [part.faces().sort_by_distance(p)[0] for p in [
        (21.85162, 38.0238, 3),
    ]]
    chamfer1_edges_3 = [part.edges().sort_by_distance(p)[0] for p in [
        (-21.85162, 35.7251, 3),
    ]]
    chamfer1_side_3 = [part.faces().sort_by_distance(p)[0] for p in [
        (-21.85162, 38.0238, 3),
    ]]
    chamfer1_edges_4 = [part.edges().sort_by_distance(p)[0] for p in [
        (-21.85162, 32.7279, 3),
    ]]
    chamfer1_side_4 = [part.faces().sort_by_distance(p)[0] for p in [
        (-21.85162, 31.4452, 3),
    ]]
    chamfer1_edges_5 = [part.edges().sort_by_distance(p)[0] for p in [
        (21.85162, -35.7251, 3),
    ]]
    chamfer1_side_5 = [part.faces().sort_by_distance(p)[0] for p in [
        (21.85162, -38.0238, 3),
    ]]
    chamfer1_edges_6 = [part.edges().sort_by_distance(p)[0] for p in [
        (21.85162, -32.7279, 3),
    ]]
    chamfer1_side_6 = [part.faces().sort_by_distance(p)[0] for p in [
        (21.85162, -31.4452, 3),
    ]]
    chamfer1_edges_7 = [part.edges().sort_by_distance(p)[0] for p in [
        (-21.85162, -32.7279, 3),
    ]]
    chamfer1_side_7 = [part.faces().sort_by_distance(p)[0] for p in [
        (-21.85162, -31.4452, 3),
    ]]
    chamfer1_edges_8 = [part.edges().sort_by_distance(p)[0] for p in [
        (-21.85162, -35.7251, 3),
    ]]
    chamfer1_side_8 = [part.faces().sort_by_distance(p)[0] for p in [
        (-21.85162, -38.0238, 3),
    ]]
    chamfer1 = BRepFilletAPI_MakeChamfer(part.part.solid().wrapped)
    for e in chamfer1_edges_1:
        chamfer1.Add(CHAMFER1_SIZE, CHAMFER1_SIZE2, e.wrapped, chamfer1_side_1[0].wrapped)  # the first distance lies on this face
    for e in chamfer1_edges_2:
        chamfer1.Add(CHAMFER1_SIZE, CHAMFER1_SIZE2, e.wrapped, chamfer1_side_2[0].wrapped)  # the first distance lies on this face
    for e in chamfer1_edges_3:
        chamfer1.Add(CHAMFER1_SIZE, CHAMFER1_SIZE2, e.wrapped, chamfer1_side_3[0].wrapped)  # the first distance lies on this face
    for e in chamfer1_edges_4:
        chamfer1.Add(CHAMFER1_SIZE, CHAMFER1_SIZE2, e.wrapped, chamfer1_side_4[0].wrapped)  # the first distance lies on this face
    for e in chamfer1_edges_5:
        chamfer1.Add(CHAMFER1_SIZE, CHAMFER1_SIZE2, e.wrapped, chamfer1_side_5[0].wrapped)  # the first distance lies on this face
    for e in chamfer1_edges_6:
        chamfer1.Add(CHAMFER1_SIZE, CHAMFER1_SIZE2, e.wrapped, chamfer1_side_6[0].wrapped)  # the first distance lies on this face
    for e in chamfer1_edges_7:
        chamfer1.Add(CHAMFER1_SIZE, CHAMFER1_SIZE2, e.wrapped, chamfer1_side_7[0].wrapped)  # the first distance lies on this face
    for e in chamfer1_edges_8:
        chamfer1.Add(CHAMFER1_SIZE, CHAMFER1_SIZE2, e.wrapped, chamfer1_side_8[0].wrapped)  # the first distance lies on this face
    add(Compound.cast(chamfer1.Shape()), mode=Mode.REPLACE)

    # Fillet14
    fillet14_edges = [part.edges().sort_by_distance(p)[0] for p in [
        (14.99362, 35.7251, 3),
        (14.99362, 32.7279, 3),
        (-14.99362, 32.7279, 3),
        (-14.99362, 35.7251, 3),
        (14.99362, -32.7279, 3),
        (14.99362, -35.7251, 3),
        (-14.99362, -35.7251, 3),
        (-14.99362, -32.7279, 3),
    ]]
    fillet(fillet14_edges, radius=FILLET14_R)


solid = part.part
